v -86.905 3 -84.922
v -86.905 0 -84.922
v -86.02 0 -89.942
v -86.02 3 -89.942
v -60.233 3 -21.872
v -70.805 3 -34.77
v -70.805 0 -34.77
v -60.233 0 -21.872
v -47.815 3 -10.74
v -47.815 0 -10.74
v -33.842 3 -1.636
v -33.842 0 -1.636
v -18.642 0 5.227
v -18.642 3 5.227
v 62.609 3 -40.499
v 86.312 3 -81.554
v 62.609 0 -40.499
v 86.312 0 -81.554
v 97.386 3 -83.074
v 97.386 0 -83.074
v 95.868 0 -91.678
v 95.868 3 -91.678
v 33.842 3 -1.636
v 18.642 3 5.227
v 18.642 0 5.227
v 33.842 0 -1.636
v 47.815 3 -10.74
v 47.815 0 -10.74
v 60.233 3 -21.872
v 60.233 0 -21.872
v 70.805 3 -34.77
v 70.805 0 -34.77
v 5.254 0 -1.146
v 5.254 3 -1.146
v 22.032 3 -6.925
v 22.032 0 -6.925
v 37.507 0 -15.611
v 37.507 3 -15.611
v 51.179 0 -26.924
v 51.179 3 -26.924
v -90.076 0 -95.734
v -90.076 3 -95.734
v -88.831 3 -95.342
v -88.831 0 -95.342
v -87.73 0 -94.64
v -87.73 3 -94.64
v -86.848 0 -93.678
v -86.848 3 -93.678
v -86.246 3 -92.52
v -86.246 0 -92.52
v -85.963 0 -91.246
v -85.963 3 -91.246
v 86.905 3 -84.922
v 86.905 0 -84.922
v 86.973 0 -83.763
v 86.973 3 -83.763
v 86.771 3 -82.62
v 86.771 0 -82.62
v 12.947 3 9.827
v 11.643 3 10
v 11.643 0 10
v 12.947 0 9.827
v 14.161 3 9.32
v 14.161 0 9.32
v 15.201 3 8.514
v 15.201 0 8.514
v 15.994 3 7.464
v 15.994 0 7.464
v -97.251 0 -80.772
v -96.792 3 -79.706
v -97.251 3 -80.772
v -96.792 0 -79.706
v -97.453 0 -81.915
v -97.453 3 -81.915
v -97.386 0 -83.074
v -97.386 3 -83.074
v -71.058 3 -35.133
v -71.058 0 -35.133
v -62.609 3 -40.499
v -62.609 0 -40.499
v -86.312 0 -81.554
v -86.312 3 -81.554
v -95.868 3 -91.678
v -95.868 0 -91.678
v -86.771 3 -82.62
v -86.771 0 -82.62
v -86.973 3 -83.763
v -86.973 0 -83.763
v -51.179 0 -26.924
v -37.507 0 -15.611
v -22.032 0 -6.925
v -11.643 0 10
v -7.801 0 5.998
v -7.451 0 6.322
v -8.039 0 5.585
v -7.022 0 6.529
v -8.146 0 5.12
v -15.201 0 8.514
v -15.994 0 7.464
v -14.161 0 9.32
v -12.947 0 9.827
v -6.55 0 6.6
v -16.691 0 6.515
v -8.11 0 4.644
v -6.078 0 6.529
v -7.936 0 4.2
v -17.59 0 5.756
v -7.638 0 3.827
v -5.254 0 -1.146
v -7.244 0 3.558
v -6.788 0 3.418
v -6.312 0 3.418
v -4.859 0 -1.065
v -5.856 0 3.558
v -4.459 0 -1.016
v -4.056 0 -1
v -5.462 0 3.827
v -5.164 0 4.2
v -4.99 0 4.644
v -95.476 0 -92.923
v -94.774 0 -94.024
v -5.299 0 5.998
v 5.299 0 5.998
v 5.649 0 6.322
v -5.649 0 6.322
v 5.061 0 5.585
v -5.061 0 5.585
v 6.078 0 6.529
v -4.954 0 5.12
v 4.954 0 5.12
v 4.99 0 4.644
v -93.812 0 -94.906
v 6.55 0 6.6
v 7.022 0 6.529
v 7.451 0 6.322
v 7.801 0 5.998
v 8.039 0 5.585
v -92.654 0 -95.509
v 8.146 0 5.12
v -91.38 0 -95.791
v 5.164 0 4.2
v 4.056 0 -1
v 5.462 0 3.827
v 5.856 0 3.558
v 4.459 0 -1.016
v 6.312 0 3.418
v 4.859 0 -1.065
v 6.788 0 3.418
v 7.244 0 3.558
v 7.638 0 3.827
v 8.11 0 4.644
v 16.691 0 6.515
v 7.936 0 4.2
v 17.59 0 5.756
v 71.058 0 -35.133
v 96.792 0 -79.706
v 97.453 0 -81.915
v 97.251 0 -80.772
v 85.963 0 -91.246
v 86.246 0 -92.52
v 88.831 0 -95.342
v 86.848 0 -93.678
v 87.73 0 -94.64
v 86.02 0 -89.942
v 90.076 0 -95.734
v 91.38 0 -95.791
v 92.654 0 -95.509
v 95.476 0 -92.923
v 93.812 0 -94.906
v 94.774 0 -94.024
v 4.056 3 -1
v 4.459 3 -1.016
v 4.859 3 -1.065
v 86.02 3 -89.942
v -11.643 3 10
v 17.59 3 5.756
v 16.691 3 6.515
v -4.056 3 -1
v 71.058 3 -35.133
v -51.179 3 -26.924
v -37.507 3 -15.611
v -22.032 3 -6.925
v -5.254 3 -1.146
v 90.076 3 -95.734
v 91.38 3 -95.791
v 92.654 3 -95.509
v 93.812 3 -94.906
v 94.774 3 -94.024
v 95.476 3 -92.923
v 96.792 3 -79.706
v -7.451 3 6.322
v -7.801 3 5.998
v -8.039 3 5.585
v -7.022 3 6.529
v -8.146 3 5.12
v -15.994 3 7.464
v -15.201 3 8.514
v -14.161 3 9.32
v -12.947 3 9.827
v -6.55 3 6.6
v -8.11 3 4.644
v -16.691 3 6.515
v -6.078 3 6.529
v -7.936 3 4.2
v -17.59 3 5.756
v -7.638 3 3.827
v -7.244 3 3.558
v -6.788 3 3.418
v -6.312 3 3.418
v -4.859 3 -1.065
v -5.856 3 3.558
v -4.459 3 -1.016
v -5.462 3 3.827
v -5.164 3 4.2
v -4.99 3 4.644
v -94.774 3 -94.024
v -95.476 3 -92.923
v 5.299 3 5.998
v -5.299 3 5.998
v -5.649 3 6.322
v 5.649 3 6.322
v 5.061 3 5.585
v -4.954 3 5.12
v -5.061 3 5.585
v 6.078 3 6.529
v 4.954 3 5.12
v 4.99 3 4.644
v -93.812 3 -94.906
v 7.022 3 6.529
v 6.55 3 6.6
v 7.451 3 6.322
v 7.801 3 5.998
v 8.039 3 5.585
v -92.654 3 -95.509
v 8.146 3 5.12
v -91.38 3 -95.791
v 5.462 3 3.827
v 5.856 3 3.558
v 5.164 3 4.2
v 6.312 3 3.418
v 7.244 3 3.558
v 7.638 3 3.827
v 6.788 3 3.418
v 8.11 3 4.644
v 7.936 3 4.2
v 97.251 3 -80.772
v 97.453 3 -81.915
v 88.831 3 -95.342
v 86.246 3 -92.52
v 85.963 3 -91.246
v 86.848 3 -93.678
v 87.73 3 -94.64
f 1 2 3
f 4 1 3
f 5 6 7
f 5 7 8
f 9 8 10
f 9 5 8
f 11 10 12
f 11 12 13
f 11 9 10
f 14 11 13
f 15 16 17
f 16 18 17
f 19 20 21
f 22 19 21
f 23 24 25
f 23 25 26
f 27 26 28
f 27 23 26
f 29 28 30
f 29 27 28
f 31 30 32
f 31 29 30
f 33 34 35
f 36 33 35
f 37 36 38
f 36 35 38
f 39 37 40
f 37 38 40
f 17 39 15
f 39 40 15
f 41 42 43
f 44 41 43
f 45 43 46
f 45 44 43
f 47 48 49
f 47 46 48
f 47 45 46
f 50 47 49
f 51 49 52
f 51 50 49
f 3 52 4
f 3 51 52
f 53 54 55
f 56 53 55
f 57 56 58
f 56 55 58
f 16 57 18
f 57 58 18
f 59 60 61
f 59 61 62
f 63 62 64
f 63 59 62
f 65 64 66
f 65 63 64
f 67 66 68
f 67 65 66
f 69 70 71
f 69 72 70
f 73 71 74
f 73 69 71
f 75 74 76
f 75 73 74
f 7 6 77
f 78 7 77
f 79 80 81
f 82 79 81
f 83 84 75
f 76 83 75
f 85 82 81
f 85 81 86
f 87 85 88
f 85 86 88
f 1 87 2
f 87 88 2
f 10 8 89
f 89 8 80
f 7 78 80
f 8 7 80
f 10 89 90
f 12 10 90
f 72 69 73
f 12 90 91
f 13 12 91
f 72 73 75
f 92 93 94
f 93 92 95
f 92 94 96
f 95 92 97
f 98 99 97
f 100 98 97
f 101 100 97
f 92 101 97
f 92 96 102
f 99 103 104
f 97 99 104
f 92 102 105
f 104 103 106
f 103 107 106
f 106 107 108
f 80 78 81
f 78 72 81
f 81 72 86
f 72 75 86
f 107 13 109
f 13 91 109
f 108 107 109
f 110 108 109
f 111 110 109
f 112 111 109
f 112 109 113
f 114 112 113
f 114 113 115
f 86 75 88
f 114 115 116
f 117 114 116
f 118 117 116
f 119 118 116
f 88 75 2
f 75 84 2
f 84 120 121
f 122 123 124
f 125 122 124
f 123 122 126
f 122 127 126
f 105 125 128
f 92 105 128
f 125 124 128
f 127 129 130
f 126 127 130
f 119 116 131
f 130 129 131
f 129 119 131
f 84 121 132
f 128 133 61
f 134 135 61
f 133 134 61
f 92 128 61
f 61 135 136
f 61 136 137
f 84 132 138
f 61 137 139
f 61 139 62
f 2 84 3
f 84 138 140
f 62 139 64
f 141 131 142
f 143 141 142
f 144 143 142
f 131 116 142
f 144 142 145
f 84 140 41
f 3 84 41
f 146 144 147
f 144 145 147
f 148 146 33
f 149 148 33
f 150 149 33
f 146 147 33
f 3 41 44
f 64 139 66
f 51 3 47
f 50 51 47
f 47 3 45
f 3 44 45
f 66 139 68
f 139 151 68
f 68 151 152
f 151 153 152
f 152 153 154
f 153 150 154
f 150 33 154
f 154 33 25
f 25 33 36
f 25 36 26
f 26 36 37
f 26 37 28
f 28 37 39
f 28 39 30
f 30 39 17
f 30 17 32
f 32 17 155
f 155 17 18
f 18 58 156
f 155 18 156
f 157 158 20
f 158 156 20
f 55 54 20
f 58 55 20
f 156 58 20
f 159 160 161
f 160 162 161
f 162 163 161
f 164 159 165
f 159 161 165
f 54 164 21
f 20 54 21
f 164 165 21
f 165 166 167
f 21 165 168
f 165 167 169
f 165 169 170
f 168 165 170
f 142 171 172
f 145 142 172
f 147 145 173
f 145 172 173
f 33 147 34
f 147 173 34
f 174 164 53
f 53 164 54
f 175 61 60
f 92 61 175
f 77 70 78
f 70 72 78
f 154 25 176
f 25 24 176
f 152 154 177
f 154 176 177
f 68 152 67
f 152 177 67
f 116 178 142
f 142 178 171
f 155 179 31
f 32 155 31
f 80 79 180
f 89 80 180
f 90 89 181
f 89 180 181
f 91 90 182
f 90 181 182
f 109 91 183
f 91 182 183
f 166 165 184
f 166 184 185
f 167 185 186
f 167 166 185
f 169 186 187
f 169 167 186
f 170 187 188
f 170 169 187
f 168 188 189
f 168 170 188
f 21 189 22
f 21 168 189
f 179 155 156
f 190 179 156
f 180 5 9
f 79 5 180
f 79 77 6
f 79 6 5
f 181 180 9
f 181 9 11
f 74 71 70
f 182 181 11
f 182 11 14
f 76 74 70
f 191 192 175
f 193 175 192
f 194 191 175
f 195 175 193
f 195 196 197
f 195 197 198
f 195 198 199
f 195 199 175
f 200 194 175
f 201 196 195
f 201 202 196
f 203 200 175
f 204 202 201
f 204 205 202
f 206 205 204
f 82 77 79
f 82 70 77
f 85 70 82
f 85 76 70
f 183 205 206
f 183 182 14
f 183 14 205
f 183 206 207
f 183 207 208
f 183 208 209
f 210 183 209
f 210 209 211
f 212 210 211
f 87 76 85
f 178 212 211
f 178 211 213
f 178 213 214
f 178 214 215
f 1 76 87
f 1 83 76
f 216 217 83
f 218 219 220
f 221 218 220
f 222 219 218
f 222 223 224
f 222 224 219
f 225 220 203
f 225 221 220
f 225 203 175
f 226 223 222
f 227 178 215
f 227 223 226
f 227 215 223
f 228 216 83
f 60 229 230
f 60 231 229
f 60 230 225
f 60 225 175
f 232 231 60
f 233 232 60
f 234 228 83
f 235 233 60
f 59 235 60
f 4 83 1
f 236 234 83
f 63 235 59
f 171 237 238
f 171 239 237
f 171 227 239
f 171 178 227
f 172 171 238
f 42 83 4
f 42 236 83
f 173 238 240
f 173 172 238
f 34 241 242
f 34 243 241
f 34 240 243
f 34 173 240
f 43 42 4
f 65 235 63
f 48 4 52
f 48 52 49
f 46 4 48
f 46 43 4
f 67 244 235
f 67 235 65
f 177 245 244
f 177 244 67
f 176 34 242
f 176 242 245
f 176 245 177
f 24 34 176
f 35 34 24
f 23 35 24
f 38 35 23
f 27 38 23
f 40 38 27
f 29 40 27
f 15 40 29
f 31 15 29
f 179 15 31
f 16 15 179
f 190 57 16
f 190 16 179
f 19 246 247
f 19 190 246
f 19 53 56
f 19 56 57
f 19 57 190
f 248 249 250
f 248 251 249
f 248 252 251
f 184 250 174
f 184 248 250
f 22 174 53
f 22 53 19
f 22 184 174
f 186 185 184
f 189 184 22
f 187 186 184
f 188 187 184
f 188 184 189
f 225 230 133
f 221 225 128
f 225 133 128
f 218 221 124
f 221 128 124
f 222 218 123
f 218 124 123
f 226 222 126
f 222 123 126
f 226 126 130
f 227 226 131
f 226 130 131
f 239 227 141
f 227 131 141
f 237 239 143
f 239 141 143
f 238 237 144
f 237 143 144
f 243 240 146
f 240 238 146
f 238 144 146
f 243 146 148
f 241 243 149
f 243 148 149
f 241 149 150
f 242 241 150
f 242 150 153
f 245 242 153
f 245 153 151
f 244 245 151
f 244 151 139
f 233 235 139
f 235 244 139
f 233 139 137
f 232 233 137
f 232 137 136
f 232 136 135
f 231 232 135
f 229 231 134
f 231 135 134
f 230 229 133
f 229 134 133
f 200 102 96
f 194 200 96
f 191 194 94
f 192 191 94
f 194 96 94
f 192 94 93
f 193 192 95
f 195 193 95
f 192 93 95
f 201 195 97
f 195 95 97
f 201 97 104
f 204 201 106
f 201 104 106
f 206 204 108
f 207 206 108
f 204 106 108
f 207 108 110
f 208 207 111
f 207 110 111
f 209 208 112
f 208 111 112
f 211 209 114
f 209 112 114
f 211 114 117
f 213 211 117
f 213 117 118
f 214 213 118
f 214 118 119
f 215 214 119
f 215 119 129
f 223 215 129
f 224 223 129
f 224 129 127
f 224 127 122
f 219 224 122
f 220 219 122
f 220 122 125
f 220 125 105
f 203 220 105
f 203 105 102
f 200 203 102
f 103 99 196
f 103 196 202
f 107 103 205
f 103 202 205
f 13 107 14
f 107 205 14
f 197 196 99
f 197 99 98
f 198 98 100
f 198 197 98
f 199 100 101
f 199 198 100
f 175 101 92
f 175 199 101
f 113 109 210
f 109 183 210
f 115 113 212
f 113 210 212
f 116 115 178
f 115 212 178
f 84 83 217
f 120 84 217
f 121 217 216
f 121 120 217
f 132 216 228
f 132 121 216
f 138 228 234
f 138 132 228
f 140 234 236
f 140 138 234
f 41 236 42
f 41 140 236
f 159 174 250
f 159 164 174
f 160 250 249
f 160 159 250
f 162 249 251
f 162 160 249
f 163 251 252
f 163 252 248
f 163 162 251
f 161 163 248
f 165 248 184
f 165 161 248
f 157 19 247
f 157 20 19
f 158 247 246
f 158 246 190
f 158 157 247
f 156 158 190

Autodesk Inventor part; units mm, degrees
ref_plane "YZ Plane" through (0, 0, 0) normal (1, 0, 0) x (0, 1, 0)
ref_plane "XZ Plane" through (0, 0, 0) normal (0, 1, 0) x (-1, 0, 0)
ref_plane "XY Plane" through (0, 0, 0) normal (0, 0, 1) x (1, 0, 0)
sketch "Sketch1" plane through (0, 0, 0) normal (0, 1, 0) x (-1, 0, 0)
  line L0 (0, 0) -> (0, 10)
  line L1 (0, 10) -> (42.1132, 10)
  line L2 (0, 0) -> (36.3397, 0)
  line L3 (40.6699, -2.5) -> (86.3115, -81.5535)
  line L4 (86.9054, -84.9218) -> (86.0202, -89.942)
  line L5 (90.076, -95.7343) -> (90.076, -95.7343)
  line L6 (95.8682, -91.6785) -> (97.3855, -83.0739)
  line L7 (96.7916, -79.7056) -> (46.4434, 7.5)
  arc A0 (45.5774, 9) -> (43.8453, 10) centre (43.8453, 8) ccw
  arc A1 (40.6699, -2.5) -> (36.3397, 0) centre (36.3397, -5) ccw
  arc A2 (86.9054, -84.9218) -> (86.3115, -81.5535) centre (81.9813, -84.0535) ccw
  arc A3 (97.3855, -83.0739) -> (96.7916, -79.7056) centre (92.4614, -82.2056) ccw
  arc A4 (46.4434, 7.5) -> (42.1132, 10) centre (42.1132, 5) ccw
  arc A5 (90.076, -95.7343) -> (95.8682, -91.6785) centre (90.9442, -90.8103) ccw
  arc A6 (86.0202, -89.942) -> (90.076, -95.7343) centre (90.9442, -90.8103) ccw
  point P0 (85.1519, -94.8661)
  point P1 (95, -96.6025)
  point P2 (45, 10)
  point P3 (90.076, -95.7343)
  dimension "d1" = 120
  dimension "d2" = 140
  dimension "d3" = 45
  dimension "d4" = 50
  dimension "d5" = 10
  dimension "d6" = 10
  dimension "d7" = 10
  dimension "d8" = 2
  dimension "d9" = 5
extrude "Extrusion1" add sketch "Sketch1" along normal blind 3
sketch "Sketch2" plane through (0, 3, 0) normal (0, 1, 0) x (1, 0, 0)
  line L0 (0, -10) -> (0, 0) projected
  line L1 (0, -5) -> (-25.3234, -5) construction
  point P0 (-6.55, -5)
  dimension "d19" = 6.55
hole "Hole1" at (-6.55, 3, 5) direction (0, -1, 0) diameter 3.2 end through all clearance for "Countersunk Flat Head Screw DIN EN ISO 2009" size "M3" standard "DIN"
mirror "Mirror1" about plane through (0, 0, 0) normal (1, 0, 0) of "Extrusion1", "Hole1"
sketch "Sketch3" plane through (0, 3, 0) normal (0, 1, 0) x (1, 0, 0)
  line L0 (-40.6699, 2.5) -> (-86.3115, 81.5535) projected
  line L1 (-36.3397, 0) -> (36.3397, 0) projected
  arc A0 (-71.1338, 55.2651) -> (0, 0) centre (18.4247, 97.1272) ccw
  line L2 (-40.6699, 2.5) -> (-86.3115, 81.5535) projected
  arc A1 (-40.6699, 2.5) -> (-36.3397, 0) centre (-36.3397, 5) ccw projected
  point P0 (-62.6082, 40.4983)
extrude "Extrusion2" add sketch "Sketch3" against normal up to surface (3 mm away) contours L0 A0 L1 A1
mirror "Mirror2" about plane through (0, 0, 0) normal (1, 0, 0) of "Extrusion2"
fillet "Fillet1" radius 5 1 edges at (0, 1.5, 0)
sketch "Sketch4" plane through (0, 3, 0) normal (0, 1, 0) x (1, 0, 0)
  arc A0 (-62.6082, 40.4983) -> (-0.9815, 0.1913) centre (18.4247, 97.1272) ccw projected
  arc A1 (-70.805, 34.7701) -> (-2.9445, -9.6141) centre (18.4247, 97.1272) ccw
  line L0 (-96.7916, 79.7056) -> (-46.4434, -7.5) projected
  arc A2 (-46.4434, -7.5) -> (-42.1132, -10) centre (-42.1132, -5) ccw projected
  line L1 (-42.1132, -10) -> (42.1132, -10) projected
  line L2 (-16.55, -5.9607) -> (-16.55, -10)
  circle A3 centre (-6.55, -5) radius 1.6 projected
  line L3 (-70.805, 34.7701) -> (-71.0577, 35.1332)
  point P0 (0, 0)
  point P1 (-16.55, -7.9804)
  dimension "d23" = 10
  dimension "d24" = 10
extrude "Extrusion3" cut sketch "Sketch4" against normal blind 10 contours A1 L2 L1 A2 L0 L3
fillet "Fillet2" radius 5 2 edges at (-16.55, 1.5, 5.9607) (-16.55, 1.5, 10)
mirror "Mirror3" about plane through (0, 0, 0) normal (1, 0, 0) of "Fillet2", "Extrusion3"
ref_plane "Work Plane1" through (-11.6432, 0, 0) normal (0, 0, 1) x (1, 0, 0)
sketch "Sketch5" plane through (-11.6432, 0, 0) normal (0, 0, 1) x (1, 0, 0)
  line L0 (0, 3) -> (23.2863, 3) projected
  line L1 (11.6432, 3) -> (11.6432, 0)
  line L2 (19.7932, 0) -> (16.5932, 0) projected
  line L3 (6.6932, 3) -> (16.5932, 3)
  line L4 (16.5932, 3) -> (16.5932, 0)
  line L5 (16.5932, 0) -> (6.6932, 0)
  line L6 (6.6932, 0) -> (6.6932, 3)
  line L7 (6.6932, 3) -> (16.5932, 0) construction
  line L8 (16.5932, 3) -> (6.6932, 0) construction
  point P0 (11.6432, 1.5)
extrude "Extrusion4" add sketch "Sketch5" against normal blind 1
fillet "Fillet3" radius 5 2 edges at (-4.6561, 1.5, -1) (4.6561, 1.5, -1)
properties part number "Claw1" material "Copper, Cast"
